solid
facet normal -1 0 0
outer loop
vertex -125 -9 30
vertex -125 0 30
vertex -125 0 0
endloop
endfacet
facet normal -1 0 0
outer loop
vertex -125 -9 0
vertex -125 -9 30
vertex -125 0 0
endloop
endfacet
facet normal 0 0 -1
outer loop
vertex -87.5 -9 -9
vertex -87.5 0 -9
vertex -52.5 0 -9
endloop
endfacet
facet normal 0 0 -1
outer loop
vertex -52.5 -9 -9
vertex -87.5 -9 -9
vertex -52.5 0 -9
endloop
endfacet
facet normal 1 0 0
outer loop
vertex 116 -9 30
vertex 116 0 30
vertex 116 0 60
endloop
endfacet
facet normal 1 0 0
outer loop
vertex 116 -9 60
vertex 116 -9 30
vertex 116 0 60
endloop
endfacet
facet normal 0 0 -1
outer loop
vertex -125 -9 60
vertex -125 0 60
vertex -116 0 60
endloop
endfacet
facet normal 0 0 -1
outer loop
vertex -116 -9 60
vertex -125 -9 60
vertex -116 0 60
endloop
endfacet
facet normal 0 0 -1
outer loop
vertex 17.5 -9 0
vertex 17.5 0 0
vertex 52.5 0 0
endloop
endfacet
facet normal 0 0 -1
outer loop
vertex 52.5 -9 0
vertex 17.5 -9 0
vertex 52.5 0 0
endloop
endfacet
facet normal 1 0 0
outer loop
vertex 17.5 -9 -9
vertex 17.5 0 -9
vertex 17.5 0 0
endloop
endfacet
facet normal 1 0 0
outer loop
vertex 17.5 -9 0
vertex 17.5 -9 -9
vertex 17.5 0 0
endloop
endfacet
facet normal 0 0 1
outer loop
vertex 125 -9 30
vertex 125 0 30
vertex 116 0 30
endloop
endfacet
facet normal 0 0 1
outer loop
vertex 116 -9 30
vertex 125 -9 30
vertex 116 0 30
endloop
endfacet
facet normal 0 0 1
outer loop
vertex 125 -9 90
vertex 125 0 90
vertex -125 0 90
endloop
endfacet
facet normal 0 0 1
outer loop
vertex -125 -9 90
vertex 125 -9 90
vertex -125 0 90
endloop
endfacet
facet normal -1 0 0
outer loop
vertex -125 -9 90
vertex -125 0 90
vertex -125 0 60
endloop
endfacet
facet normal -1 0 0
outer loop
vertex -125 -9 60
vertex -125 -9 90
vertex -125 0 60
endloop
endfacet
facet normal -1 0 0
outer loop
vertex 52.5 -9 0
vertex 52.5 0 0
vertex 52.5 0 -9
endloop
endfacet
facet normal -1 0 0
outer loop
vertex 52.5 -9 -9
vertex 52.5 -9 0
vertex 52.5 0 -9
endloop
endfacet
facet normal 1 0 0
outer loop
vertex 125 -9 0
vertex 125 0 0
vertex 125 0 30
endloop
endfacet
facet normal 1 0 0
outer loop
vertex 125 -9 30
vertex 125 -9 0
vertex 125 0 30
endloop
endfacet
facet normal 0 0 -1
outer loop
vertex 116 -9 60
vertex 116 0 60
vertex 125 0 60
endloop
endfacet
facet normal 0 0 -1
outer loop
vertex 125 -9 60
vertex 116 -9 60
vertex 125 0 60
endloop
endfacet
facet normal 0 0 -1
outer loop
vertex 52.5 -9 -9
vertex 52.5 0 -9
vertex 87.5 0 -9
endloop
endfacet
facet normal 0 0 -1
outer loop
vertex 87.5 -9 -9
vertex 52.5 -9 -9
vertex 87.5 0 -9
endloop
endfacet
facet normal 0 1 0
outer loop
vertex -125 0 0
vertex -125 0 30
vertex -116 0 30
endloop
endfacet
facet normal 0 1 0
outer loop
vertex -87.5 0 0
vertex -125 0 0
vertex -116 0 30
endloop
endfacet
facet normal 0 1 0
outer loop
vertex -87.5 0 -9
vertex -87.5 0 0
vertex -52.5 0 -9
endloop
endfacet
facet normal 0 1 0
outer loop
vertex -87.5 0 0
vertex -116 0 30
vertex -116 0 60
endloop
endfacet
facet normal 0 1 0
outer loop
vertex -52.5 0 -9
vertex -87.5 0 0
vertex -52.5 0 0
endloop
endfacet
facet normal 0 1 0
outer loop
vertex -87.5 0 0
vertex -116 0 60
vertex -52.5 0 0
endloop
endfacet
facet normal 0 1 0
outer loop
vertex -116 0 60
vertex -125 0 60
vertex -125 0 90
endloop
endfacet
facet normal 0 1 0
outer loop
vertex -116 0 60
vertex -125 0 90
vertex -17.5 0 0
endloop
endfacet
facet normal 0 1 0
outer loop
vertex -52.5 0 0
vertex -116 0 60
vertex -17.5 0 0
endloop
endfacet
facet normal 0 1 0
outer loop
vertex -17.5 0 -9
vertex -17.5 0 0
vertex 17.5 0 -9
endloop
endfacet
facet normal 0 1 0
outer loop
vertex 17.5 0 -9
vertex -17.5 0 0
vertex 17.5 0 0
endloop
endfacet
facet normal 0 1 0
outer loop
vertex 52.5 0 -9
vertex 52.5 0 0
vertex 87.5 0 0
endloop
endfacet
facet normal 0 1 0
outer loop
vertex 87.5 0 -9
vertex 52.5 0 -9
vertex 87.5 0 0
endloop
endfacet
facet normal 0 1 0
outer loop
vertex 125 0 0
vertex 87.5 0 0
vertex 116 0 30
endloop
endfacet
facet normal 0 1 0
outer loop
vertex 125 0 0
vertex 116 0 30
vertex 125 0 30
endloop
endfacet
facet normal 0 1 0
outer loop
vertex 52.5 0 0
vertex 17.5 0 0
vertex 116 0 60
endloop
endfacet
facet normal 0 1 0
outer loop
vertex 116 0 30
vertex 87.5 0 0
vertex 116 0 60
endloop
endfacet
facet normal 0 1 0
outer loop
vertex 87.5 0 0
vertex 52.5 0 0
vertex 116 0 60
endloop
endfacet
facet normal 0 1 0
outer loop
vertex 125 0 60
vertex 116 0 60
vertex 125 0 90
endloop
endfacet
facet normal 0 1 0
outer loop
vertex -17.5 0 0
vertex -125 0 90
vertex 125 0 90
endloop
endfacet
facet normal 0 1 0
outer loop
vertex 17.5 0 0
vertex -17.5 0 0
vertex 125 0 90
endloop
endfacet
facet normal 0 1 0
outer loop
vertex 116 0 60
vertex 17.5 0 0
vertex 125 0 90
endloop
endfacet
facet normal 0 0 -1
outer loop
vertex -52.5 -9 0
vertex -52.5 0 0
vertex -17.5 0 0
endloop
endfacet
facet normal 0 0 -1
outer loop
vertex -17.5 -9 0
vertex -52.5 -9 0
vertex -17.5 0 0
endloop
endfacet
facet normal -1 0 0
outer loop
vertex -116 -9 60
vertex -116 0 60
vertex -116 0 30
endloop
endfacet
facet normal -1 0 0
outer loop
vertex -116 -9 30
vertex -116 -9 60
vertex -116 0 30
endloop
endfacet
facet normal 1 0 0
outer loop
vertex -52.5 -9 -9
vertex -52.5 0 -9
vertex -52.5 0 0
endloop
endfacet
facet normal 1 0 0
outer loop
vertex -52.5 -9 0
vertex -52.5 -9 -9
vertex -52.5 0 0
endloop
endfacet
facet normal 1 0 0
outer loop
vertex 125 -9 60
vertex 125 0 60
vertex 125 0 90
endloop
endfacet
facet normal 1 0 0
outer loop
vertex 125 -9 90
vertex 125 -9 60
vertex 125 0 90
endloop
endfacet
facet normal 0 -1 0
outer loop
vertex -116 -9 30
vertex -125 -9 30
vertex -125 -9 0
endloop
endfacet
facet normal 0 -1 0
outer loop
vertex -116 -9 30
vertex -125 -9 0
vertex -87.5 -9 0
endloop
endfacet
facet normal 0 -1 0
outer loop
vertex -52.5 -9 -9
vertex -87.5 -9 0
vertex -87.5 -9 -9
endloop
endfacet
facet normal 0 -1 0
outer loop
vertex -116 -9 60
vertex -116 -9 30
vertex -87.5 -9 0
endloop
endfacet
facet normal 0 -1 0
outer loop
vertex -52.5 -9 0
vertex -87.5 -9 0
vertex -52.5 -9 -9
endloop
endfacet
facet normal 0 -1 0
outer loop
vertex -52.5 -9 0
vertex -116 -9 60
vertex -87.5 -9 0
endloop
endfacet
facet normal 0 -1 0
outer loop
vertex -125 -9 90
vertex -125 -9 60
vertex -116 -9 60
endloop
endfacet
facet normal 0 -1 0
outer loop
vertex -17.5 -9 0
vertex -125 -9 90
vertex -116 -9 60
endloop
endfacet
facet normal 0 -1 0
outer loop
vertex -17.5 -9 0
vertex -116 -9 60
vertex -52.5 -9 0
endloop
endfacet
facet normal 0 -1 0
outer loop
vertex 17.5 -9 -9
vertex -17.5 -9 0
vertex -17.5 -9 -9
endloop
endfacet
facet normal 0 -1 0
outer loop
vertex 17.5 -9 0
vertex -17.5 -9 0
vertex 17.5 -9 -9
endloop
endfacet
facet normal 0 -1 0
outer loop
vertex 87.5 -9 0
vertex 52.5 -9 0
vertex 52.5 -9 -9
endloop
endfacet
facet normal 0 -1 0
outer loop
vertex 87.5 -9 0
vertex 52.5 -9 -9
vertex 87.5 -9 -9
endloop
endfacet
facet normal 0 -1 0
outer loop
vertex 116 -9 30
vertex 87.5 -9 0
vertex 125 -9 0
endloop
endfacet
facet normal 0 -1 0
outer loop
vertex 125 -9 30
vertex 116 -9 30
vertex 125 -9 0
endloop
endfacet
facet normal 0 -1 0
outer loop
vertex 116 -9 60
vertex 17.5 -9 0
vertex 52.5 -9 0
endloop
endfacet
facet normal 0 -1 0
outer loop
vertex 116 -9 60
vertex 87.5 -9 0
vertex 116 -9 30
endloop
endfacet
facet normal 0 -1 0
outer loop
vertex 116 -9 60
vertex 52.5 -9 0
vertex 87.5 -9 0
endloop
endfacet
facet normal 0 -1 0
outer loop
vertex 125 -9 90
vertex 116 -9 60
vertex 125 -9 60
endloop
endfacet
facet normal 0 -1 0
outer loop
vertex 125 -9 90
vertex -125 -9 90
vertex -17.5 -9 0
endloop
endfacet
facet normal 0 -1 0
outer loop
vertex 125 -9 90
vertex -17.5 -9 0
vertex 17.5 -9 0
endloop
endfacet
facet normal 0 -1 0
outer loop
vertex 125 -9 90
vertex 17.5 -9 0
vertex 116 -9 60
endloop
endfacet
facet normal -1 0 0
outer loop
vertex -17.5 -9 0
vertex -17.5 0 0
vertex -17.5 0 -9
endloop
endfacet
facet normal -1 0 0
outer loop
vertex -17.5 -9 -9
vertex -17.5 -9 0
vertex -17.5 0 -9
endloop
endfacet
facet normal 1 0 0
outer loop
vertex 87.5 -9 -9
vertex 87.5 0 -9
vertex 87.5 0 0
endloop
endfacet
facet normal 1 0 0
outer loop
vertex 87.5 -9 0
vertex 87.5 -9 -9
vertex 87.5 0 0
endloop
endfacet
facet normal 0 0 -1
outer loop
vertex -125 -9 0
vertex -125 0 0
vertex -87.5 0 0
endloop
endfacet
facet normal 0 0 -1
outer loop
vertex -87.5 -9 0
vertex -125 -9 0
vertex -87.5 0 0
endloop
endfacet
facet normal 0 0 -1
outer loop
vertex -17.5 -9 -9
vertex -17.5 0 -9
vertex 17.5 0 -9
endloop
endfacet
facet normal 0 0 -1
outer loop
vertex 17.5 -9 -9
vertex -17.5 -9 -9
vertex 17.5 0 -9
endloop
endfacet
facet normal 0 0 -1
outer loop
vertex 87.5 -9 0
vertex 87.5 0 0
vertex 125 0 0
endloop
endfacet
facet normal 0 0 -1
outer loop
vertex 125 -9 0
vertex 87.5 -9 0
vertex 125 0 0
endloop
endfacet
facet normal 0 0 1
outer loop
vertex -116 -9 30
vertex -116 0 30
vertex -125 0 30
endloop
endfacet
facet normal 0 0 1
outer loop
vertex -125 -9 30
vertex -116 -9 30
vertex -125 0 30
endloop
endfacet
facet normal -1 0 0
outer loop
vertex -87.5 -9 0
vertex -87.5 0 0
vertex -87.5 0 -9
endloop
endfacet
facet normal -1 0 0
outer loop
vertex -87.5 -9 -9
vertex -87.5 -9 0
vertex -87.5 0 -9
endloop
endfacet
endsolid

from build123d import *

# Parameters (mm, degrees)
F1_DEPTH = 9


with BuildPart() as f1:
    # F0 (on Front) → F1 (new body)
    with BuildSketch(Plane.XZ):
        Polygon((0, 90), (-125, 90), (-125, 60), (-116, 60), (-116, 30), (-125, 30), (-125, 0), (-116, 0), (-87.5, 0), (-87.5, -9), (-52.5, -9), (-52.5, 0), (-17.5, 0), (-17.5, -9), (0, -9), (17.5, -9), (17.5, 0), (52.5, 0), (52.5, -9), (87.5, -9), (87.5, 0), (125, 0), (125, 30), (116, 30), (116, 60), (125, 60), (125, 90), align=None)
    extrude(amount=F1_DEPTH)


solid = f1.part
